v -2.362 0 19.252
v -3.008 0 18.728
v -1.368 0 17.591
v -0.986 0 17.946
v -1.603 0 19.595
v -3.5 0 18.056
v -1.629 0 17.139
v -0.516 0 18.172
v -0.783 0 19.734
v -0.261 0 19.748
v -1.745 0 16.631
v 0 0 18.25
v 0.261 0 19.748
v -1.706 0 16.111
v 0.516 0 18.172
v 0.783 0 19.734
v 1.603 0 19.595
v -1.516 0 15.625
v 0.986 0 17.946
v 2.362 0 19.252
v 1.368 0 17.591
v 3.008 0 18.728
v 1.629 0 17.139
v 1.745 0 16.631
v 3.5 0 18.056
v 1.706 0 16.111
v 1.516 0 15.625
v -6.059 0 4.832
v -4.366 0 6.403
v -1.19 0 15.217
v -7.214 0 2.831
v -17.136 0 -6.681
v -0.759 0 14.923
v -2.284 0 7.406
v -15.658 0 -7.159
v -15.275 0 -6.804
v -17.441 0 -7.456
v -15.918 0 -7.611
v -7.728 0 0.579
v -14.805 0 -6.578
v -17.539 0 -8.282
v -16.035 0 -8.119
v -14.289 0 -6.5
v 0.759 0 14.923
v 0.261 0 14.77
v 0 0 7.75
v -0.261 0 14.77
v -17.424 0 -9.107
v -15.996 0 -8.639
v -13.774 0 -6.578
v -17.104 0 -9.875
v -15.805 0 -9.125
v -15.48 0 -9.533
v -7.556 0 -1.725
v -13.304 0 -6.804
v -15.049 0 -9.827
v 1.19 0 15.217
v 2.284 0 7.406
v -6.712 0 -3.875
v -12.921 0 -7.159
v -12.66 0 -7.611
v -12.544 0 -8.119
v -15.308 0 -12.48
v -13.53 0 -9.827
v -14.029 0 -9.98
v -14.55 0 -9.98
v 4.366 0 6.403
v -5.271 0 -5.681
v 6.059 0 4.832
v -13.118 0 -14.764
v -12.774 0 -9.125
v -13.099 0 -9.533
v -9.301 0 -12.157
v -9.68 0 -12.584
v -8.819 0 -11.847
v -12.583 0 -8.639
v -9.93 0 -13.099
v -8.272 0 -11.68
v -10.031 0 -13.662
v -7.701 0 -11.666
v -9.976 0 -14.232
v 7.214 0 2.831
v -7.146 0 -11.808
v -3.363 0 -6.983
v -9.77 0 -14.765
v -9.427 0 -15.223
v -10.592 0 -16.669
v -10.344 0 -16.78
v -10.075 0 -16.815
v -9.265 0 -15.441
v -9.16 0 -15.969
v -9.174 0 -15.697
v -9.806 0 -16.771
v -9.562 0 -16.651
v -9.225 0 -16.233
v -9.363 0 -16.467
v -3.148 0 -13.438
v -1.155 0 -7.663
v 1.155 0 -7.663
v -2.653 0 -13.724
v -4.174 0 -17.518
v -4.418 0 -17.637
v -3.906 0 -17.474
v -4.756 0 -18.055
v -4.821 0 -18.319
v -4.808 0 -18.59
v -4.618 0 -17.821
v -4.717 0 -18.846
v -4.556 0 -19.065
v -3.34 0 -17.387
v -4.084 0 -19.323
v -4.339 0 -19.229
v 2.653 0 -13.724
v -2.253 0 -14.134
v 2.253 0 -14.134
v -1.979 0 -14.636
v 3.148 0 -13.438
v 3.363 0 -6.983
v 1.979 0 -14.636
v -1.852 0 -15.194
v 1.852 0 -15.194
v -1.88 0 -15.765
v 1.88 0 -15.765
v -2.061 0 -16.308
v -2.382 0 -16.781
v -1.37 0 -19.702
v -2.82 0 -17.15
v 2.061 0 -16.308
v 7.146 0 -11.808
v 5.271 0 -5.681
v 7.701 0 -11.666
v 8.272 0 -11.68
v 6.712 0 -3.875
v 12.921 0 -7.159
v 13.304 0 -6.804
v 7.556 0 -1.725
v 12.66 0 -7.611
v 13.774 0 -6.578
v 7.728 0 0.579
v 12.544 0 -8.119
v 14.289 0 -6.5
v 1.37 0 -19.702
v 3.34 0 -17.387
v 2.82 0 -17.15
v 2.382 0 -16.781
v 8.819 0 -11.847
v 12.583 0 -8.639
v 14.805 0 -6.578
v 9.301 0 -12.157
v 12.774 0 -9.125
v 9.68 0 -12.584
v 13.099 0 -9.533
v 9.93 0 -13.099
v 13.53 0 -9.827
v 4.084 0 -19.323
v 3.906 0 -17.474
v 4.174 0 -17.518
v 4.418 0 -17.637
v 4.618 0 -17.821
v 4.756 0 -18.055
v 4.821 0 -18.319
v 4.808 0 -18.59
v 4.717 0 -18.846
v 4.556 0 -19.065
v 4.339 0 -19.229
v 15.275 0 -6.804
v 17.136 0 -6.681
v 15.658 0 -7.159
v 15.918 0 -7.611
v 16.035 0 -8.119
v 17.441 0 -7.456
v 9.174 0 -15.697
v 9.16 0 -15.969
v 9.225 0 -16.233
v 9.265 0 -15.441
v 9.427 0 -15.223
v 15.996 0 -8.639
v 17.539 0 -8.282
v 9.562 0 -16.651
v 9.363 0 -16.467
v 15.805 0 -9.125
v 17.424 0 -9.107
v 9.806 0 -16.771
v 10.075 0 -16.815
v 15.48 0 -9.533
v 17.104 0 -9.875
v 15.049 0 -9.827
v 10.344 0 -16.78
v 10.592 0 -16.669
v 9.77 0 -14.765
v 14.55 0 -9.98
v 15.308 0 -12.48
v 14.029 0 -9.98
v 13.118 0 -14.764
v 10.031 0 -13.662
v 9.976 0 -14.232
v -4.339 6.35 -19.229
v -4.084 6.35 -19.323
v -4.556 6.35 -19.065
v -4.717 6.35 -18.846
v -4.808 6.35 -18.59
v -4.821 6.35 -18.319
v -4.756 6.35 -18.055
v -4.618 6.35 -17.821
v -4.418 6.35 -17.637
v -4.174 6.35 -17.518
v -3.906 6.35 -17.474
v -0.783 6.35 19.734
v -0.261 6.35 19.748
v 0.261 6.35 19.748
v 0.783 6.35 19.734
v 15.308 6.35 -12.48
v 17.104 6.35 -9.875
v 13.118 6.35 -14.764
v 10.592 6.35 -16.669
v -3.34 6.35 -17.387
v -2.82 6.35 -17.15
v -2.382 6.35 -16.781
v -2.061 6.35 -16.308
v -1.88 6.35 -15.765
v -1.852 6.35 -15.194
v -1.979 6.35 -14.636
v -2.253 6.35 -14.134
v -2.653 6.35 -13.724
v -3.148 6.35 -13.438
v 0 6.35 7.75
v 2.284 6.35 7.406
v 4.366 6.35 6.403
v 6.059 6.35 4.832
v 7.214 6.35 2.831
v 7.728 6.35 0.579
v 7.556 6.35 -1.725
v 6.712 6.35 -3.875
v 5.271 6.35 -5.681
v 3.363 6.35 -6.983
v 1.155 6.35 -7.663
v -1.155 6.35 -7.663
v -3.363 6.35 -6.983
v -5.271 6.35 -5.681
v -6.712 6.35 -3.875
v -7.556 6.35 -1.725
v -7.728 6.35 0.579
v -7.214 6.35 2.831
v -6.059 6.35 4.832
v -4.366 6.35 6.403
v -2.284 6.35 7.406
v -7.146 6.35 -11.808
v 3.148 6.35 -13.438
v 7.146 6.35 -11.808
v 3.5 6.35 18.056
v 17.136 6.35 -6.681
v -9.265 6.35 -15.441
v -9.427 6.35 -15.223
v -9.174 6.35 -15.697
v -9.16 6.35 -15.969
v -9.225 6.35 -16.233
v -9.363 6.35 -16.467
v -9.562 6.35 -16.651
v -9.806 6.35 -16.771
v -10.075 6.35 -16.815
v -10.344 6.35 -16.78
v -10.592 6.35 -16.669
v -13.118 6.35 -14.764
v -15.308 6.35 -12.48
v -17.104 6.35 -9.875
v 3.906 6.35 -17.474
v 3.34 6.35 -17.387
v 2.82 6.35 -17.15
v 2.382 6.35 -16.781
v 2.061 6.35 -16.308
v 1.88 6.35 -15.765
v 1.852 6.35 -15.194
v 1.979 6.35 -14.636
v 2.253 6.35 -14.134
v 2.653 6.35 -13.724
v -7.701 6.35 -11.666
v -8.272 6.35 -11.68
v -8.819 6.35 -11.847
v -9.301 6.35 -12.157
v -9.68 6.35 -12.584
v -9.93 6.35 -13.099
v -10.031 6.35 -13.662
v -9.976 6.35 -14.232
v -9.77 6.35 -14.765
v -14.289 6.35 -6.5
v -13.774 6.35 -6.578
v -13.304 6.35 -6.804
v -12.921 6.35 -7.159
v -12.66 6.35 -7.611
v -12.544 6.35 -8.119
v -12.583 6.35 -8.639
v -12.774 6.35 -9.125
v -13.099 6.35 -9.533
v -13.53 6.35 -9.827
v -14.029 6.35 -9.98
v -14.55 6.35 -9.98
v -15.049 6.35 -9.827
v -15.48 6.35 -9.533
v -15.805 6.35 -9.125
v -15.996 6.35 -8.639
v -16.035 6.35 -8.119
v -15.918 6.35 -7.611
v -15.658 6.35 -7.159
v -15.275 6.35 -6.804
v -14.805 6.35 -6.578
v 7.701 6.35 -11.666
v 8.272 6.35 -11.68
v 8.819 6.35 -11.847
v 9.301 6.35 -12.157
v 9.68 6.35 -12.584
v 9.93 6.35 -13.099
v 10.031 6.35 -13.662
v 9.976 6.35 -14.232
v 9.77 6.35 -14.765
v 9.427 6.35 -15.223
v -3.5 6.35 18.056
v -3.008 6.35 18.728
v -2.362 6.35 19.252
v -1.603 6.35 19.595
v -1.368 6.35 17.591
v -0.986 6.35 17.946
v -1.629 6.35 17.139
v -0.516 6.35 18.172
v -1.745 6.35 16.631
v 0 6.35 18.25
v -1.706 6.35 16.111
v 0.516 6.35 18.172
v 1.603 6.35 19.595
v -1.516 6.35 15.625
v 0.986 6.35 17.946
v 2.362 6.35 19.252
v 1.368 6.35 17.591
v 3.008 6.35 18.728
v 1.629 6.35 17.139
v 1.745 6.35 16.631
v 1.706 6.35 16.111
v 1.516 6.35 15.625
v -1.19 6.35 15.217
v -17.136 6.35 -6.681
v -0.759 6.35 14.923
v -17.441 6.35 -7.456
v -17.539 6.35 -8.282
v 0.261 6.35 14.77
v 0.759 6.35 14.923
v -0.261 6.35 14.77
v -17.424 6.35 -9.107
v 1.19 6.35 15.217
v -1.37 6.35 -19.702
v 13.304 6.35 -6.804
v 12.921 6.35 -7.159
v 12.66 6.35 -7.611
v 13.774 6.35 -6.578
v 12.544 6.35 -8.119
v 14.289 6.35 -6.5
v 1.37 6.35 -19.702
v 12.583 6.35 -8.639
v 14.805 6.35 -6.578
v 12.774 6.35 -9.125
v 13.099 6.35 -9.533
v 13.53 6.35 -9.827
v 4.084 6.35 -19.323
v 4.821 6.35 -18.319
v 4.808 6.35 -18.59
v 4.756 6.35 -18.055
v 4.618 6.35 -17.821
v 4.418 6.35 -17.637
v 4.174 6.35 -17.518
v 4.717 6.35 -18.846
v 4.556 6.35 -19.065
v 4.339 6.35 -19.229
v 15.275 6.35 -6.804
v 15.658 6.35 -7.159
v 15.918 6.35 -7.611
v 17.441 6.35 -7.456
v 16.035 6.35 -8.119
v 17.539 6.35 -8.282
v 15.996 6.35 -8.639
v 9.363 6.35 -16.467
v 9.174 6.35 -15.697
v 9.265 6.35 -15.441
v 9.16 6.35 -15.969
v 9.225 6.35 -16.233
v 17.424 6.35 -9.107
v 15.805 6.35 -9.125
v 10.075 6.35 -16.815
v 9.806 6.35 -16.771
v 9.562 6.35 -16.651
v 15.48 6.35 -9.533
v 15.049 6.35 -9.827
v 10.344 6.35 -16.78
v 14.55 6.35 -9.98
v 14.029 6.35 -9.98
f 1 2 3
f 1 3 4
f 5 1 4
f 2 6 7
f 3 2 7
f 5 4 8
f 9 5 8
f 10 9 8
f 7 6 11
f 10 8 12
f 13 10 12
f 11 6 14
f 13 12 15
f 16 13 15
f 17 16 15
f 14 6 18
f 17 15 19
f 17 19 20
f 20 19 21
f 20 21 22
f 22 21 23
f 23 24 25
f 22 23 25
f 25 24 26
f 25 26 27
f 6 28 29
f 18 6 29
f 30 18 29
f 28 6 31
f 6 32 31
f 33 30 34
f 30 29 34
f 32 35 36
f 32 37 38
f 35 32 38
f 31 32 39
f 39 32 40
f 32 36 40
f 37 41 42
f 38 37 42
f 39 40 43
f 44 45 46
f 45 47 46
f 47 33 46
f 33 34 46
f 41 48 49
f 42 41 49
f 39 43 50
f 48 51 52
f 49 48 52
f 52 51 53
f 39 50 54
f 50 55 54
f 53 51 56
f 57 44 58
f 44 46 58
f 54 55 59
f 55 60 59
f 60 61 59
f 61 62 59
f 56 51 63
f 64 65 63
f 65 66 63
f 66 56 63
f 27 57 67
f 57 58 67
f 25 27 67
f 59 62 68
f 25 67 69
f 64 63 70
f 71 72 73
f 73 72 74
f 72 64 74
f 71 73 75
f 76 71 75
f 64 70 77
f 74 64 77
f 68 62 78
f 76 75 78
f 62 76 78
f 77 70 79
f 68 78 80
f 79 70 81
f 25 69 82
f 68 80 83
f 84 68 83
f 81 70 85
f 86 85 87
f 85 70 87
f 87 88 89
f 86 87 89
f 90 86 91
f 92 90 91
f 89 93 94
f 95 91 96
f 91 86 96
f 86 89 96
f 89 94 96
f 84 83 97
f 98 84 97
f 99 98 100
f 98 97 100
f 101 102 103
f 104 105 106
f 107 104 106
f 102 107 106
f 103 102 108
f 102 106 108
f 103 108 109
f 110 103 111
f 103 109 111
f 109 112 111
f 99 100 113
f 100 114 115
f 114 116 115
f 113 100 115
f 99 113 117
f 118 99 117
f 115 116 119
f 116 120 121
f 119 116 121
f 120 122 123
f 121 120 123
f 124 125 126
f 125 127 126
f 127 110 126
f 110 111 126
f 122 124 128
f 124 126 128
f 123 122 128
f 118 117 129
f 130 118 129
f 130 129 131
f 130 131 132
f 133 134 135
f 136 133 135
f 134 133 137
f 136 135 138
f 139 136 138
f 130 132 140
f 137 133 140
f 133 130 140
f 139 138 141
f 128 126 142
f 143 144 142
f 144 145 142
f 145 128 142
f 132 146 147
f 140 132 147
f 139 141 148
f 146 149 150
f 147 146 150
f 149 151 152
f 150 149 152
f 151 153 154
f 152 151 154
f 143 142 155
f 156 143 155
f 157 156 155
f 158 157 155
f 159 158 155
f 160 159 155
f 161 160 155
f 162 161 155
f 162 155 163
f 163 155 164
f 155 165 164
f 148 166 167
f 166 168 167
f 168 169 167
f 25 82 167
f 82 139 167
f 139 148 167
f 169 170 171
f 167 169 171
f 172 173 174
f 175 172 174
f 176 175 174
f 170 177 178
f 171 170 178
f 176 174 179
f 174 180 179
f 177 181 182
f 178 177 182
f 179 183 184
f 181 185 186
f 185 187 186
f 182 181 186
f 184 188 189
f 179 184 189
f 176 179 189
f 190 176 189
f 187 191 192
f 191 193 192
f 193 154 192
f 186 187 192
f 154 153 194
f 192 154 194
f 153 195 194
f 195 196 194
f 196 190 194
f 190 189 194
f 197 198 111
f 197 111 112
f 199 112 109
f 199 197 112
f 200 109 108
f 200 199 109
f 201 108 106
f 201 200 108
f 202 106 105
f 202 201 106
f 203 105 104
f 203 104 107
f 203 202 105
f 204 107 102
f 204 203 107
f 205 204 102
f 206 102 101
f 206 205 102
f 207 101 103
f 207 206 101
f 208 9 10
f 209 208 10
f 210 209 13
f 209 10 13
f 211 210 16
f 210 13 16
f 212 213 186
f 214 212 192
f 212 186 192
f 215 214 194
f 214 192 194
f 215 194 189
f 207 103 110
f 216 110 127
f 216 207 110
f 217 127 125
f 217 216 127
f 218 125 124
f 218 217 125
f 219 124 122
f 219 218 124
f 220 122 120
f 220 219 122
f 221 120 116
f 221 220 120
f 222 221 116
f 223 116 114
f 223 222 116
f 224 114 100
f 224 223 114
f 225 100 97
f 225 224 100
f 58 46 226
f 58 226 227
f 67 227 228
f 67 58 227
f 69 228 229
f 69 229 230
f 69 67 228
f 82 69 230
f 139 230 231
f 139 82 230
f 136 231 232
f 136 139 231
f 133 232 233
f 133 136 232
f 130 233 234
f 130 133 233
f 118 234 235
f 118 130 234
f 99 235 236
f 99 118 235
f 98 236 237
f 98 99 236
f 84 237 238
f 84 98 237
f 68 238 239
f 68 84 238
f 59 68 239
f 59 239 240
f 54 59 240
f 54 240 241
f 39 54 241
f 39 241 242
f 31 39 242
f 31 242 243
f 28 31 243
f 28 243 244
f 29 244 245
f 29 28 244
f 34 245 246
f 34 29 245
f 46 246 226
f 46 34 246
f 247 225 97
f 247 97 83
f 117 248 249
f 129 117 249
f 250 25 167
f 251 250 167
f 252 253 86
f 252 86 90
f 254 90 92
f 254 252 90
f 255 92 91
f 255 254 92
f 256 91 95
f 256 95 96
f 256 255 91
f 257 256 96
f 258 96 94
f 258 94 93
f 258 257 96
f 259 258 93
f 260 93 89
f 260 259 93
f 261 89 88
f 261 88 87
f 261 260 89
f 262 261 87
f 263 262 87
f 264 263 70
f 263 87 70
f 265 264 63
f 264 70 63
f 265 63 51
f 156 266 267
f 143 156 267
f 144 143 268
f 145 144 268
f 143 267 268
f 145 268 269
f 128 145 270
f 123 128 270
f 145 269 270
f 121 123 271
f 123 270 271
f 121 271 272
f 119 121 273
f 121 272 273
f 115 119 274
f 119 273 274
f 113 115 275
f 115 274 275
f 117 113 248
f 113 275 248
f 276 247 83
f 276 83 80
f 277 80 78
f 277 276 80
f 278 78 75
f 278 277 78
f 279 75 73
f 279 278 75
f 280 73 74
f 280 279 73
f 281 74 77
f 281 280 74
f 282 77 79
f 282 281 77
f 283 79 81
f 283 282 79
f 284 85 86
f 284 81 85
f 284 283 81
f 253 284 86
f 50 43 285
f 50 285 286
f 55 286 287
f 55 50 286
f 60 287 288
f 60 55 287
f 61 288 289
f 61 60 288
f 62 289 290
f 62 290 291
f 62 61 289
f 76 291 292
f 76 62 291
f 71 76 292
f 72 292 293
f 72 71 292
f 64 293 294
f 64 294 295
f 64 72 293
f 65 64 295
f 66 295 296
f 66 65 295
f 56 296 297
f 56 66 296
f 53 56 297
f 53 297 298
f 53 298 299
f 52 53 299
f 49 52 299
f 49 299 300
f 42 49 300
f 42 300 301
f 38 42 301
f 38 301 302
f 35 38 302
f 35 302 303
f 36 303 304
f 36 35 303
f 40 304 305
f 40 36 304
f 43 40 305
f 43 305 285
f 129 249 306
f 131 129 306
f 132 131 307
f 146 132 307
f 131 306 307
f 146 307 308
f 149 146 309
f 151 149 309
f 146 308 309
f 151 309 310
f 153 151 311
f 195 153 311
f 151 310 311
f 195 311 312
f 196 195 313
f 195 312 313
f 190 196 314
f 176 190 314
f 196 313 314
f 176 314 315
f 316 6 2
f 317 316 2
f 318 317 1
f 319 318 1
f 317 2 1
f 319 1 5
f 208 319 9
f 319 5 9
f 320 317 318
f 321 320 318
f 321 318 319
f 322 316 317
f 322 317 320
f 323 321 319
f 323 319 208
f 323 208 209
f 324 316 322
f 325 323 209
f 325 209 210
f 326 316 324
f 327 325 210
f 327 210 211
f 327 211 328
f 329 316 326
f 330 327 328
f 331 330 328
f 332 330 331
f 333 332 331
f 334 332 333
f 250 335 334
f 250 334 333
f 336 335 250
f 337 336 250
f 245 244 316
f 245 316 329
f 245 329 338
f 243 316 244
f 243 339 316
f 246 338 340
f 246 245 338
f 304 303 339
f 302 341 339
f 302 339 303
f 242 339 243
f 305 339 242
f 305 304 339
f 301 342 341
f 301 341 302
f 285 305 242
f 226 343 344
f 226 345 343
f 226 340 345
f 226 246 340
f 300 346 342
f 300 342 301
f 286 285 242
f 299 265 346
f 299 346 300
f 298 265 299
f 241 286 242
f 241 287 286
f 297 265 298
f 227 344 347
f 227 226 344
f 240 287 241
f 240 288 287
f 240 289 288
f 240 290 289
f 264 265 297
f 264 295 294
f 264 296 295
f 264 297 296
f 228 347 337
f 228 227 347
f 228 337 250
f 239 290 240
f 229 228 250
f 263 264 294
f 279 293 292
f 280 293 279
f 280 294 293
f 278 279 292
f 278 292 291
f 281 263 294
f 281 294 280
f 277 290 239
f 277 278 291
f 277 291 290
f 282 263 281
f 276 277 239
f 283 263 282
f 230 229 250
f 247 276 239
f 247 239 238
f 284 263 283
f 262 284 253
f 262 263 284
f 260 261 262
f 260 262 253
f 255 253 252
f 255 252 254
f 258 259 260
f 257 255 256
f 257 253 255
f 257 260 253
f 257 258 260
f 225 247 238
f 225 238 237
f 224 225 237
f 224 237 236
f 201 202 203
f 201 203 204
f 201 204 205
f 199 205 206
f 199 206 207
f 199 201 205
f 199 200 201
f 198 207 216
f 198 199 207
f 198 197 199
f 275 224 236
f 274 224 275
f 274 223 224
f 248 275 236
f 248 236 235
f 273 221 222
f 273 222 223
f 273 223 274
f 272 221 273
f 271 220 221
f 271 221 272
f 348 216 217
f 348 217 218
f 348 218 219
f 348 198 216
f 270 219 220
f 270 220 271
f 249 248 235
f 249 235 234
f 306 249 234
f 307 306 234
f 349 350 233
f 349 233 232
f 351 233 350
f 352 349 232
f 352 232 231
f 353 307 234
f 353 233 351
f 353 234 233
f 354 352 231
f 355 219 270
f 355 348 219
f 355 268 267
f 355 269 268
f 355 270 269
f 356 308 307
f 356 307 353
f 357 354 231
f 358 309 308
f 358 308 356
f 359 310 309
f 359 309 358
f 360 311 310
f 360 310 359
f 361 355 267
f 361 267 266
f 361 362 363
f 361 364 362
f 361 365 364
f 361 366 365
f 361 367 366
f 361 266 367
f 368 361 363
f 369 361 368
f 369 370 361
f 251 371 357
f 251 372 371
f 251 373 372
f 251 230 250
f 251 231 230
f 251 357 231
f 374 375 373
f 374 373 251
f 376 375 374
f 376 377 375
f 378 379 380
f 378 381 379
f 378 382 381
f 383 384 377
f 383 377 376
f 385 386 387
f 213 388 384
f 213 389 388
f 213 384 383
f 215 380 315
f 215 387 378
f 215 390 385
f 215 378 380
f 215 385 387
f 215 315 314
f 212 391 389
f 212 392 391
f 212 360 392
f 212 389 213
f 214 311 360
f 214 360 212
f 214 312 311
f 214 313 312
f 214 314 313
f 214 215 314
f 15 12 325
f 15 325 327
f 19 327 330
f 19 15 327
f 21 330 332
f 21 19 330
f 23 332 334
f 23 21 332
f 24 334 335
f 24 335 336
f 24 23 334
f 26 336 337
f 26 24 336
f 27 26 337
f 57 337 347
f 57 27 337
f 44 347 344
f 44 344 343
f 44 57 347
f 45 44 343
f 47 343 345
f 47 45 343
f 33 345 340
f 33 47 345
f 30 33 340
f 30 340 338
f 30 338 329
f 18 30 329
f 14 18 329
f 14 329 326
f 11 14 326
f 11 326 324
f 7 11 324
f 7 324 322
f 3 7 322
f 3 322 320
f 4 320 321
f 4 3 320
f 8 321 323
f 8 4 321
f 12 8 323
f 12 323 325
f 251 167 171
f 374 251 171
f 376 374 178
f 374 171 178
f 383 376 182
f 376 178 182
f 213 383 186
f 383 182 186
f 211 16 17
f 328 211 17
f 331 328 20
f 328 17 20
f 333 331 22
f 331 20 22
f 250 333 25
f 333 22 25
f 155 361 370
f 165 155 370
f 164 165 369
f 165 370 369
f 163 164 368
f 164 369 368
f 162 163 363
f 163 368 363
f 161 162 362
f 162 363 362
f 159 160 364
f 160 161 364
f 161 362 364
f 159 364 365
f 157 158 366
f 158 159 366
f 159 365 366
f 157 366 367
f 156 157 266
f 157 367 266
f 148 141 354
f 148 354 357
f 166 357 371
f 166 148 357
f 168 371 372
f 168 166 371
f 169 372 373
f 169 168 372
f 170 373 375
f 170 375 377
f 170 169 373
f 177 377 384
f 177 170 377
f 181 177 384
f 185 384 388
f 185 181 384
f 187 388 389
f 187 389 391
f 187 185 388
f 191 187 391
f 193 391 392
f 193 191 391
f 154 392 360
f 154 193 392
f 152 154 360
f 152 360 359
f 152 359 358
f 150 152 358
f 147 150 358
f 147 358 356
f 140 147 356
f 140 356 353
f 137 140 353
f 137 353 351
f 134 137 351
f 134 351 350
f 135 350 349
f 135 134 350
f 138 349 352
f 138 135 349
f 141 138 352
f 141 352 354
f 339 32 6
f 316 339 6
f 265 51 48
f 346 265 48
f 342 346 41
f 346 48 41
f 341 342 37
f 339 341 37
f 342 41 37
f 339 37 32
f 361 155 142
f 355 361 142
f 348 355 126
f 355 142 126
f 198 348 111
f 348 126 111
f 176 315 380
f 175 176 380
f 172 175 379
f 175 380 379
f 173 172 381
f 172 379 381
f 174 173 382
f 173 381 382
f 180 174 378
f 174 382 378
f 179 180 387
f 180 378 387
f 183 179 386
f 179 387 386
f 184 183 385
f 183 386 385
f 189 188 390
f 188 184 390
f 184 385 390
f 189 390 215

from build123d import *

# Parameters (mm, degrees)
SKETCH1_R           = 7.75
SKETCH1_R_2         = 1.75
BOSS_EXTRUDE1_DEPTH = 6.35
CUT_EXTRUDE1_DEPTH  = 7.35


with BuildPart() as part:
    # Sketch1 → Boss-Extrude1 (new body)
    with BuildSketch(Plane(origin=(0, 0, 0), x_dir=(1, 0, 0), z_dir=(0, 1, 0))):
        with BuildLine():
            Line((-17.135648679, 6.681090334), (-3.5, -18.055952583))
            ThreePointArc((-3.5, -18.055952583), (-2.361702731, -19.252086758), (-0.782543458, -19.734490765))
            ThreePointArc((-0.782543458, -19.734490765), (0, -19.75), (0.782543458, -19.734490765))
            ThreePointArc((0.782543458, -19.734490765), (2.361702731, -19.252086758), (3.5, -18.055952583))
            Line((3.5, -18.055952583), (17.135648679, 6.681090334))
            ThreePointArc((17.135648679, 6.681090334), (17.539259633, 8.282201146), (17.104001725, 9.875))
            ThreePointArc((17.104001725, 9.875), (0, 19.75), (-17.104001725, 9.875))
            ThreePointArc((-17.104001725, 9.875), (-17.539259633, 8.282201146), (-17.135648679, 6.681090334))
        make_face()
        with Locations(Location((0, 0, 0), (0, 0, 270))):  # turned: the seam where the file's is
            Circle(SKETCH1_R, mode=Mode.SUBTRACT)
        with Locations(Location((-14.289419162, 8.25, 0), (0, 0, 270))):  # turned: the seam where the file's is
            Circle(SKETCH1_R_2, mode=Mode.SUBTRACT)
        with Locations(Location((0, -16.5, 0), (0, 0, 270))):  # turned: the seam where the file's is
            Circle(SKETCH1_R_2, mode=Mode.SUBTRACT)
        with Locations(Location((14.289419162, 8.25, 0), (0, 0, 270))):  # turned: the seam where the file's is
            Circle(SKETCH1_R_2, mode=Mode.SUBTRACT)
    extrude(amount=BOSS_EXTRUDE1_DEPTH)

    # Sketch2 → Cut-Extrude1 (cut, through all)
    with BuildSketch(Plane(origin=(0, 6.35, 0), x_dir=(1, 0, 0), z_dir=(0, 1, 0))):
        with BuildLine():
            Line((3.147914252, 13.43813294), (7.146291664, 11.807764247))
            ThreePointArc((7.146291664, 11.807764247), (9.680193531, 12.584478285), (9.426519569, 15.222582318))
            ThreePointArc((9.426519569, 15.222582318), (9.362829603, 16.466865659), (10.592172309, 16.669384685))
            ThreePointArc((10.592172309, 16.669384685), (7.457105532, 18.288085659), (4.084045388, 19.323122762))
            ThreePointArc((4.084045388, 19.323122762), (4.821258852, 18.318725553), (3.905659686, 17.473754778))
            ThreePointArc((3.905659686, 17.473754778), (1.879612558, 15.765224297), (3.147914252, 13.43813294))
        make_face()
    cut_extrude1 = extrude(amount=-CUT_EXTRUDE1_DEPTH, mode=Mode.SUBTRACT)

    # Mirror1: Cut-Extrude1 across plane
    add(cut_extrude1.mirror(Plane(origin=(0, 0, 0), x_dir=(0, 0, 1), z_dir=(1, 0, 0))), mode=Mode.SUBTRACT)


solid = part.part
